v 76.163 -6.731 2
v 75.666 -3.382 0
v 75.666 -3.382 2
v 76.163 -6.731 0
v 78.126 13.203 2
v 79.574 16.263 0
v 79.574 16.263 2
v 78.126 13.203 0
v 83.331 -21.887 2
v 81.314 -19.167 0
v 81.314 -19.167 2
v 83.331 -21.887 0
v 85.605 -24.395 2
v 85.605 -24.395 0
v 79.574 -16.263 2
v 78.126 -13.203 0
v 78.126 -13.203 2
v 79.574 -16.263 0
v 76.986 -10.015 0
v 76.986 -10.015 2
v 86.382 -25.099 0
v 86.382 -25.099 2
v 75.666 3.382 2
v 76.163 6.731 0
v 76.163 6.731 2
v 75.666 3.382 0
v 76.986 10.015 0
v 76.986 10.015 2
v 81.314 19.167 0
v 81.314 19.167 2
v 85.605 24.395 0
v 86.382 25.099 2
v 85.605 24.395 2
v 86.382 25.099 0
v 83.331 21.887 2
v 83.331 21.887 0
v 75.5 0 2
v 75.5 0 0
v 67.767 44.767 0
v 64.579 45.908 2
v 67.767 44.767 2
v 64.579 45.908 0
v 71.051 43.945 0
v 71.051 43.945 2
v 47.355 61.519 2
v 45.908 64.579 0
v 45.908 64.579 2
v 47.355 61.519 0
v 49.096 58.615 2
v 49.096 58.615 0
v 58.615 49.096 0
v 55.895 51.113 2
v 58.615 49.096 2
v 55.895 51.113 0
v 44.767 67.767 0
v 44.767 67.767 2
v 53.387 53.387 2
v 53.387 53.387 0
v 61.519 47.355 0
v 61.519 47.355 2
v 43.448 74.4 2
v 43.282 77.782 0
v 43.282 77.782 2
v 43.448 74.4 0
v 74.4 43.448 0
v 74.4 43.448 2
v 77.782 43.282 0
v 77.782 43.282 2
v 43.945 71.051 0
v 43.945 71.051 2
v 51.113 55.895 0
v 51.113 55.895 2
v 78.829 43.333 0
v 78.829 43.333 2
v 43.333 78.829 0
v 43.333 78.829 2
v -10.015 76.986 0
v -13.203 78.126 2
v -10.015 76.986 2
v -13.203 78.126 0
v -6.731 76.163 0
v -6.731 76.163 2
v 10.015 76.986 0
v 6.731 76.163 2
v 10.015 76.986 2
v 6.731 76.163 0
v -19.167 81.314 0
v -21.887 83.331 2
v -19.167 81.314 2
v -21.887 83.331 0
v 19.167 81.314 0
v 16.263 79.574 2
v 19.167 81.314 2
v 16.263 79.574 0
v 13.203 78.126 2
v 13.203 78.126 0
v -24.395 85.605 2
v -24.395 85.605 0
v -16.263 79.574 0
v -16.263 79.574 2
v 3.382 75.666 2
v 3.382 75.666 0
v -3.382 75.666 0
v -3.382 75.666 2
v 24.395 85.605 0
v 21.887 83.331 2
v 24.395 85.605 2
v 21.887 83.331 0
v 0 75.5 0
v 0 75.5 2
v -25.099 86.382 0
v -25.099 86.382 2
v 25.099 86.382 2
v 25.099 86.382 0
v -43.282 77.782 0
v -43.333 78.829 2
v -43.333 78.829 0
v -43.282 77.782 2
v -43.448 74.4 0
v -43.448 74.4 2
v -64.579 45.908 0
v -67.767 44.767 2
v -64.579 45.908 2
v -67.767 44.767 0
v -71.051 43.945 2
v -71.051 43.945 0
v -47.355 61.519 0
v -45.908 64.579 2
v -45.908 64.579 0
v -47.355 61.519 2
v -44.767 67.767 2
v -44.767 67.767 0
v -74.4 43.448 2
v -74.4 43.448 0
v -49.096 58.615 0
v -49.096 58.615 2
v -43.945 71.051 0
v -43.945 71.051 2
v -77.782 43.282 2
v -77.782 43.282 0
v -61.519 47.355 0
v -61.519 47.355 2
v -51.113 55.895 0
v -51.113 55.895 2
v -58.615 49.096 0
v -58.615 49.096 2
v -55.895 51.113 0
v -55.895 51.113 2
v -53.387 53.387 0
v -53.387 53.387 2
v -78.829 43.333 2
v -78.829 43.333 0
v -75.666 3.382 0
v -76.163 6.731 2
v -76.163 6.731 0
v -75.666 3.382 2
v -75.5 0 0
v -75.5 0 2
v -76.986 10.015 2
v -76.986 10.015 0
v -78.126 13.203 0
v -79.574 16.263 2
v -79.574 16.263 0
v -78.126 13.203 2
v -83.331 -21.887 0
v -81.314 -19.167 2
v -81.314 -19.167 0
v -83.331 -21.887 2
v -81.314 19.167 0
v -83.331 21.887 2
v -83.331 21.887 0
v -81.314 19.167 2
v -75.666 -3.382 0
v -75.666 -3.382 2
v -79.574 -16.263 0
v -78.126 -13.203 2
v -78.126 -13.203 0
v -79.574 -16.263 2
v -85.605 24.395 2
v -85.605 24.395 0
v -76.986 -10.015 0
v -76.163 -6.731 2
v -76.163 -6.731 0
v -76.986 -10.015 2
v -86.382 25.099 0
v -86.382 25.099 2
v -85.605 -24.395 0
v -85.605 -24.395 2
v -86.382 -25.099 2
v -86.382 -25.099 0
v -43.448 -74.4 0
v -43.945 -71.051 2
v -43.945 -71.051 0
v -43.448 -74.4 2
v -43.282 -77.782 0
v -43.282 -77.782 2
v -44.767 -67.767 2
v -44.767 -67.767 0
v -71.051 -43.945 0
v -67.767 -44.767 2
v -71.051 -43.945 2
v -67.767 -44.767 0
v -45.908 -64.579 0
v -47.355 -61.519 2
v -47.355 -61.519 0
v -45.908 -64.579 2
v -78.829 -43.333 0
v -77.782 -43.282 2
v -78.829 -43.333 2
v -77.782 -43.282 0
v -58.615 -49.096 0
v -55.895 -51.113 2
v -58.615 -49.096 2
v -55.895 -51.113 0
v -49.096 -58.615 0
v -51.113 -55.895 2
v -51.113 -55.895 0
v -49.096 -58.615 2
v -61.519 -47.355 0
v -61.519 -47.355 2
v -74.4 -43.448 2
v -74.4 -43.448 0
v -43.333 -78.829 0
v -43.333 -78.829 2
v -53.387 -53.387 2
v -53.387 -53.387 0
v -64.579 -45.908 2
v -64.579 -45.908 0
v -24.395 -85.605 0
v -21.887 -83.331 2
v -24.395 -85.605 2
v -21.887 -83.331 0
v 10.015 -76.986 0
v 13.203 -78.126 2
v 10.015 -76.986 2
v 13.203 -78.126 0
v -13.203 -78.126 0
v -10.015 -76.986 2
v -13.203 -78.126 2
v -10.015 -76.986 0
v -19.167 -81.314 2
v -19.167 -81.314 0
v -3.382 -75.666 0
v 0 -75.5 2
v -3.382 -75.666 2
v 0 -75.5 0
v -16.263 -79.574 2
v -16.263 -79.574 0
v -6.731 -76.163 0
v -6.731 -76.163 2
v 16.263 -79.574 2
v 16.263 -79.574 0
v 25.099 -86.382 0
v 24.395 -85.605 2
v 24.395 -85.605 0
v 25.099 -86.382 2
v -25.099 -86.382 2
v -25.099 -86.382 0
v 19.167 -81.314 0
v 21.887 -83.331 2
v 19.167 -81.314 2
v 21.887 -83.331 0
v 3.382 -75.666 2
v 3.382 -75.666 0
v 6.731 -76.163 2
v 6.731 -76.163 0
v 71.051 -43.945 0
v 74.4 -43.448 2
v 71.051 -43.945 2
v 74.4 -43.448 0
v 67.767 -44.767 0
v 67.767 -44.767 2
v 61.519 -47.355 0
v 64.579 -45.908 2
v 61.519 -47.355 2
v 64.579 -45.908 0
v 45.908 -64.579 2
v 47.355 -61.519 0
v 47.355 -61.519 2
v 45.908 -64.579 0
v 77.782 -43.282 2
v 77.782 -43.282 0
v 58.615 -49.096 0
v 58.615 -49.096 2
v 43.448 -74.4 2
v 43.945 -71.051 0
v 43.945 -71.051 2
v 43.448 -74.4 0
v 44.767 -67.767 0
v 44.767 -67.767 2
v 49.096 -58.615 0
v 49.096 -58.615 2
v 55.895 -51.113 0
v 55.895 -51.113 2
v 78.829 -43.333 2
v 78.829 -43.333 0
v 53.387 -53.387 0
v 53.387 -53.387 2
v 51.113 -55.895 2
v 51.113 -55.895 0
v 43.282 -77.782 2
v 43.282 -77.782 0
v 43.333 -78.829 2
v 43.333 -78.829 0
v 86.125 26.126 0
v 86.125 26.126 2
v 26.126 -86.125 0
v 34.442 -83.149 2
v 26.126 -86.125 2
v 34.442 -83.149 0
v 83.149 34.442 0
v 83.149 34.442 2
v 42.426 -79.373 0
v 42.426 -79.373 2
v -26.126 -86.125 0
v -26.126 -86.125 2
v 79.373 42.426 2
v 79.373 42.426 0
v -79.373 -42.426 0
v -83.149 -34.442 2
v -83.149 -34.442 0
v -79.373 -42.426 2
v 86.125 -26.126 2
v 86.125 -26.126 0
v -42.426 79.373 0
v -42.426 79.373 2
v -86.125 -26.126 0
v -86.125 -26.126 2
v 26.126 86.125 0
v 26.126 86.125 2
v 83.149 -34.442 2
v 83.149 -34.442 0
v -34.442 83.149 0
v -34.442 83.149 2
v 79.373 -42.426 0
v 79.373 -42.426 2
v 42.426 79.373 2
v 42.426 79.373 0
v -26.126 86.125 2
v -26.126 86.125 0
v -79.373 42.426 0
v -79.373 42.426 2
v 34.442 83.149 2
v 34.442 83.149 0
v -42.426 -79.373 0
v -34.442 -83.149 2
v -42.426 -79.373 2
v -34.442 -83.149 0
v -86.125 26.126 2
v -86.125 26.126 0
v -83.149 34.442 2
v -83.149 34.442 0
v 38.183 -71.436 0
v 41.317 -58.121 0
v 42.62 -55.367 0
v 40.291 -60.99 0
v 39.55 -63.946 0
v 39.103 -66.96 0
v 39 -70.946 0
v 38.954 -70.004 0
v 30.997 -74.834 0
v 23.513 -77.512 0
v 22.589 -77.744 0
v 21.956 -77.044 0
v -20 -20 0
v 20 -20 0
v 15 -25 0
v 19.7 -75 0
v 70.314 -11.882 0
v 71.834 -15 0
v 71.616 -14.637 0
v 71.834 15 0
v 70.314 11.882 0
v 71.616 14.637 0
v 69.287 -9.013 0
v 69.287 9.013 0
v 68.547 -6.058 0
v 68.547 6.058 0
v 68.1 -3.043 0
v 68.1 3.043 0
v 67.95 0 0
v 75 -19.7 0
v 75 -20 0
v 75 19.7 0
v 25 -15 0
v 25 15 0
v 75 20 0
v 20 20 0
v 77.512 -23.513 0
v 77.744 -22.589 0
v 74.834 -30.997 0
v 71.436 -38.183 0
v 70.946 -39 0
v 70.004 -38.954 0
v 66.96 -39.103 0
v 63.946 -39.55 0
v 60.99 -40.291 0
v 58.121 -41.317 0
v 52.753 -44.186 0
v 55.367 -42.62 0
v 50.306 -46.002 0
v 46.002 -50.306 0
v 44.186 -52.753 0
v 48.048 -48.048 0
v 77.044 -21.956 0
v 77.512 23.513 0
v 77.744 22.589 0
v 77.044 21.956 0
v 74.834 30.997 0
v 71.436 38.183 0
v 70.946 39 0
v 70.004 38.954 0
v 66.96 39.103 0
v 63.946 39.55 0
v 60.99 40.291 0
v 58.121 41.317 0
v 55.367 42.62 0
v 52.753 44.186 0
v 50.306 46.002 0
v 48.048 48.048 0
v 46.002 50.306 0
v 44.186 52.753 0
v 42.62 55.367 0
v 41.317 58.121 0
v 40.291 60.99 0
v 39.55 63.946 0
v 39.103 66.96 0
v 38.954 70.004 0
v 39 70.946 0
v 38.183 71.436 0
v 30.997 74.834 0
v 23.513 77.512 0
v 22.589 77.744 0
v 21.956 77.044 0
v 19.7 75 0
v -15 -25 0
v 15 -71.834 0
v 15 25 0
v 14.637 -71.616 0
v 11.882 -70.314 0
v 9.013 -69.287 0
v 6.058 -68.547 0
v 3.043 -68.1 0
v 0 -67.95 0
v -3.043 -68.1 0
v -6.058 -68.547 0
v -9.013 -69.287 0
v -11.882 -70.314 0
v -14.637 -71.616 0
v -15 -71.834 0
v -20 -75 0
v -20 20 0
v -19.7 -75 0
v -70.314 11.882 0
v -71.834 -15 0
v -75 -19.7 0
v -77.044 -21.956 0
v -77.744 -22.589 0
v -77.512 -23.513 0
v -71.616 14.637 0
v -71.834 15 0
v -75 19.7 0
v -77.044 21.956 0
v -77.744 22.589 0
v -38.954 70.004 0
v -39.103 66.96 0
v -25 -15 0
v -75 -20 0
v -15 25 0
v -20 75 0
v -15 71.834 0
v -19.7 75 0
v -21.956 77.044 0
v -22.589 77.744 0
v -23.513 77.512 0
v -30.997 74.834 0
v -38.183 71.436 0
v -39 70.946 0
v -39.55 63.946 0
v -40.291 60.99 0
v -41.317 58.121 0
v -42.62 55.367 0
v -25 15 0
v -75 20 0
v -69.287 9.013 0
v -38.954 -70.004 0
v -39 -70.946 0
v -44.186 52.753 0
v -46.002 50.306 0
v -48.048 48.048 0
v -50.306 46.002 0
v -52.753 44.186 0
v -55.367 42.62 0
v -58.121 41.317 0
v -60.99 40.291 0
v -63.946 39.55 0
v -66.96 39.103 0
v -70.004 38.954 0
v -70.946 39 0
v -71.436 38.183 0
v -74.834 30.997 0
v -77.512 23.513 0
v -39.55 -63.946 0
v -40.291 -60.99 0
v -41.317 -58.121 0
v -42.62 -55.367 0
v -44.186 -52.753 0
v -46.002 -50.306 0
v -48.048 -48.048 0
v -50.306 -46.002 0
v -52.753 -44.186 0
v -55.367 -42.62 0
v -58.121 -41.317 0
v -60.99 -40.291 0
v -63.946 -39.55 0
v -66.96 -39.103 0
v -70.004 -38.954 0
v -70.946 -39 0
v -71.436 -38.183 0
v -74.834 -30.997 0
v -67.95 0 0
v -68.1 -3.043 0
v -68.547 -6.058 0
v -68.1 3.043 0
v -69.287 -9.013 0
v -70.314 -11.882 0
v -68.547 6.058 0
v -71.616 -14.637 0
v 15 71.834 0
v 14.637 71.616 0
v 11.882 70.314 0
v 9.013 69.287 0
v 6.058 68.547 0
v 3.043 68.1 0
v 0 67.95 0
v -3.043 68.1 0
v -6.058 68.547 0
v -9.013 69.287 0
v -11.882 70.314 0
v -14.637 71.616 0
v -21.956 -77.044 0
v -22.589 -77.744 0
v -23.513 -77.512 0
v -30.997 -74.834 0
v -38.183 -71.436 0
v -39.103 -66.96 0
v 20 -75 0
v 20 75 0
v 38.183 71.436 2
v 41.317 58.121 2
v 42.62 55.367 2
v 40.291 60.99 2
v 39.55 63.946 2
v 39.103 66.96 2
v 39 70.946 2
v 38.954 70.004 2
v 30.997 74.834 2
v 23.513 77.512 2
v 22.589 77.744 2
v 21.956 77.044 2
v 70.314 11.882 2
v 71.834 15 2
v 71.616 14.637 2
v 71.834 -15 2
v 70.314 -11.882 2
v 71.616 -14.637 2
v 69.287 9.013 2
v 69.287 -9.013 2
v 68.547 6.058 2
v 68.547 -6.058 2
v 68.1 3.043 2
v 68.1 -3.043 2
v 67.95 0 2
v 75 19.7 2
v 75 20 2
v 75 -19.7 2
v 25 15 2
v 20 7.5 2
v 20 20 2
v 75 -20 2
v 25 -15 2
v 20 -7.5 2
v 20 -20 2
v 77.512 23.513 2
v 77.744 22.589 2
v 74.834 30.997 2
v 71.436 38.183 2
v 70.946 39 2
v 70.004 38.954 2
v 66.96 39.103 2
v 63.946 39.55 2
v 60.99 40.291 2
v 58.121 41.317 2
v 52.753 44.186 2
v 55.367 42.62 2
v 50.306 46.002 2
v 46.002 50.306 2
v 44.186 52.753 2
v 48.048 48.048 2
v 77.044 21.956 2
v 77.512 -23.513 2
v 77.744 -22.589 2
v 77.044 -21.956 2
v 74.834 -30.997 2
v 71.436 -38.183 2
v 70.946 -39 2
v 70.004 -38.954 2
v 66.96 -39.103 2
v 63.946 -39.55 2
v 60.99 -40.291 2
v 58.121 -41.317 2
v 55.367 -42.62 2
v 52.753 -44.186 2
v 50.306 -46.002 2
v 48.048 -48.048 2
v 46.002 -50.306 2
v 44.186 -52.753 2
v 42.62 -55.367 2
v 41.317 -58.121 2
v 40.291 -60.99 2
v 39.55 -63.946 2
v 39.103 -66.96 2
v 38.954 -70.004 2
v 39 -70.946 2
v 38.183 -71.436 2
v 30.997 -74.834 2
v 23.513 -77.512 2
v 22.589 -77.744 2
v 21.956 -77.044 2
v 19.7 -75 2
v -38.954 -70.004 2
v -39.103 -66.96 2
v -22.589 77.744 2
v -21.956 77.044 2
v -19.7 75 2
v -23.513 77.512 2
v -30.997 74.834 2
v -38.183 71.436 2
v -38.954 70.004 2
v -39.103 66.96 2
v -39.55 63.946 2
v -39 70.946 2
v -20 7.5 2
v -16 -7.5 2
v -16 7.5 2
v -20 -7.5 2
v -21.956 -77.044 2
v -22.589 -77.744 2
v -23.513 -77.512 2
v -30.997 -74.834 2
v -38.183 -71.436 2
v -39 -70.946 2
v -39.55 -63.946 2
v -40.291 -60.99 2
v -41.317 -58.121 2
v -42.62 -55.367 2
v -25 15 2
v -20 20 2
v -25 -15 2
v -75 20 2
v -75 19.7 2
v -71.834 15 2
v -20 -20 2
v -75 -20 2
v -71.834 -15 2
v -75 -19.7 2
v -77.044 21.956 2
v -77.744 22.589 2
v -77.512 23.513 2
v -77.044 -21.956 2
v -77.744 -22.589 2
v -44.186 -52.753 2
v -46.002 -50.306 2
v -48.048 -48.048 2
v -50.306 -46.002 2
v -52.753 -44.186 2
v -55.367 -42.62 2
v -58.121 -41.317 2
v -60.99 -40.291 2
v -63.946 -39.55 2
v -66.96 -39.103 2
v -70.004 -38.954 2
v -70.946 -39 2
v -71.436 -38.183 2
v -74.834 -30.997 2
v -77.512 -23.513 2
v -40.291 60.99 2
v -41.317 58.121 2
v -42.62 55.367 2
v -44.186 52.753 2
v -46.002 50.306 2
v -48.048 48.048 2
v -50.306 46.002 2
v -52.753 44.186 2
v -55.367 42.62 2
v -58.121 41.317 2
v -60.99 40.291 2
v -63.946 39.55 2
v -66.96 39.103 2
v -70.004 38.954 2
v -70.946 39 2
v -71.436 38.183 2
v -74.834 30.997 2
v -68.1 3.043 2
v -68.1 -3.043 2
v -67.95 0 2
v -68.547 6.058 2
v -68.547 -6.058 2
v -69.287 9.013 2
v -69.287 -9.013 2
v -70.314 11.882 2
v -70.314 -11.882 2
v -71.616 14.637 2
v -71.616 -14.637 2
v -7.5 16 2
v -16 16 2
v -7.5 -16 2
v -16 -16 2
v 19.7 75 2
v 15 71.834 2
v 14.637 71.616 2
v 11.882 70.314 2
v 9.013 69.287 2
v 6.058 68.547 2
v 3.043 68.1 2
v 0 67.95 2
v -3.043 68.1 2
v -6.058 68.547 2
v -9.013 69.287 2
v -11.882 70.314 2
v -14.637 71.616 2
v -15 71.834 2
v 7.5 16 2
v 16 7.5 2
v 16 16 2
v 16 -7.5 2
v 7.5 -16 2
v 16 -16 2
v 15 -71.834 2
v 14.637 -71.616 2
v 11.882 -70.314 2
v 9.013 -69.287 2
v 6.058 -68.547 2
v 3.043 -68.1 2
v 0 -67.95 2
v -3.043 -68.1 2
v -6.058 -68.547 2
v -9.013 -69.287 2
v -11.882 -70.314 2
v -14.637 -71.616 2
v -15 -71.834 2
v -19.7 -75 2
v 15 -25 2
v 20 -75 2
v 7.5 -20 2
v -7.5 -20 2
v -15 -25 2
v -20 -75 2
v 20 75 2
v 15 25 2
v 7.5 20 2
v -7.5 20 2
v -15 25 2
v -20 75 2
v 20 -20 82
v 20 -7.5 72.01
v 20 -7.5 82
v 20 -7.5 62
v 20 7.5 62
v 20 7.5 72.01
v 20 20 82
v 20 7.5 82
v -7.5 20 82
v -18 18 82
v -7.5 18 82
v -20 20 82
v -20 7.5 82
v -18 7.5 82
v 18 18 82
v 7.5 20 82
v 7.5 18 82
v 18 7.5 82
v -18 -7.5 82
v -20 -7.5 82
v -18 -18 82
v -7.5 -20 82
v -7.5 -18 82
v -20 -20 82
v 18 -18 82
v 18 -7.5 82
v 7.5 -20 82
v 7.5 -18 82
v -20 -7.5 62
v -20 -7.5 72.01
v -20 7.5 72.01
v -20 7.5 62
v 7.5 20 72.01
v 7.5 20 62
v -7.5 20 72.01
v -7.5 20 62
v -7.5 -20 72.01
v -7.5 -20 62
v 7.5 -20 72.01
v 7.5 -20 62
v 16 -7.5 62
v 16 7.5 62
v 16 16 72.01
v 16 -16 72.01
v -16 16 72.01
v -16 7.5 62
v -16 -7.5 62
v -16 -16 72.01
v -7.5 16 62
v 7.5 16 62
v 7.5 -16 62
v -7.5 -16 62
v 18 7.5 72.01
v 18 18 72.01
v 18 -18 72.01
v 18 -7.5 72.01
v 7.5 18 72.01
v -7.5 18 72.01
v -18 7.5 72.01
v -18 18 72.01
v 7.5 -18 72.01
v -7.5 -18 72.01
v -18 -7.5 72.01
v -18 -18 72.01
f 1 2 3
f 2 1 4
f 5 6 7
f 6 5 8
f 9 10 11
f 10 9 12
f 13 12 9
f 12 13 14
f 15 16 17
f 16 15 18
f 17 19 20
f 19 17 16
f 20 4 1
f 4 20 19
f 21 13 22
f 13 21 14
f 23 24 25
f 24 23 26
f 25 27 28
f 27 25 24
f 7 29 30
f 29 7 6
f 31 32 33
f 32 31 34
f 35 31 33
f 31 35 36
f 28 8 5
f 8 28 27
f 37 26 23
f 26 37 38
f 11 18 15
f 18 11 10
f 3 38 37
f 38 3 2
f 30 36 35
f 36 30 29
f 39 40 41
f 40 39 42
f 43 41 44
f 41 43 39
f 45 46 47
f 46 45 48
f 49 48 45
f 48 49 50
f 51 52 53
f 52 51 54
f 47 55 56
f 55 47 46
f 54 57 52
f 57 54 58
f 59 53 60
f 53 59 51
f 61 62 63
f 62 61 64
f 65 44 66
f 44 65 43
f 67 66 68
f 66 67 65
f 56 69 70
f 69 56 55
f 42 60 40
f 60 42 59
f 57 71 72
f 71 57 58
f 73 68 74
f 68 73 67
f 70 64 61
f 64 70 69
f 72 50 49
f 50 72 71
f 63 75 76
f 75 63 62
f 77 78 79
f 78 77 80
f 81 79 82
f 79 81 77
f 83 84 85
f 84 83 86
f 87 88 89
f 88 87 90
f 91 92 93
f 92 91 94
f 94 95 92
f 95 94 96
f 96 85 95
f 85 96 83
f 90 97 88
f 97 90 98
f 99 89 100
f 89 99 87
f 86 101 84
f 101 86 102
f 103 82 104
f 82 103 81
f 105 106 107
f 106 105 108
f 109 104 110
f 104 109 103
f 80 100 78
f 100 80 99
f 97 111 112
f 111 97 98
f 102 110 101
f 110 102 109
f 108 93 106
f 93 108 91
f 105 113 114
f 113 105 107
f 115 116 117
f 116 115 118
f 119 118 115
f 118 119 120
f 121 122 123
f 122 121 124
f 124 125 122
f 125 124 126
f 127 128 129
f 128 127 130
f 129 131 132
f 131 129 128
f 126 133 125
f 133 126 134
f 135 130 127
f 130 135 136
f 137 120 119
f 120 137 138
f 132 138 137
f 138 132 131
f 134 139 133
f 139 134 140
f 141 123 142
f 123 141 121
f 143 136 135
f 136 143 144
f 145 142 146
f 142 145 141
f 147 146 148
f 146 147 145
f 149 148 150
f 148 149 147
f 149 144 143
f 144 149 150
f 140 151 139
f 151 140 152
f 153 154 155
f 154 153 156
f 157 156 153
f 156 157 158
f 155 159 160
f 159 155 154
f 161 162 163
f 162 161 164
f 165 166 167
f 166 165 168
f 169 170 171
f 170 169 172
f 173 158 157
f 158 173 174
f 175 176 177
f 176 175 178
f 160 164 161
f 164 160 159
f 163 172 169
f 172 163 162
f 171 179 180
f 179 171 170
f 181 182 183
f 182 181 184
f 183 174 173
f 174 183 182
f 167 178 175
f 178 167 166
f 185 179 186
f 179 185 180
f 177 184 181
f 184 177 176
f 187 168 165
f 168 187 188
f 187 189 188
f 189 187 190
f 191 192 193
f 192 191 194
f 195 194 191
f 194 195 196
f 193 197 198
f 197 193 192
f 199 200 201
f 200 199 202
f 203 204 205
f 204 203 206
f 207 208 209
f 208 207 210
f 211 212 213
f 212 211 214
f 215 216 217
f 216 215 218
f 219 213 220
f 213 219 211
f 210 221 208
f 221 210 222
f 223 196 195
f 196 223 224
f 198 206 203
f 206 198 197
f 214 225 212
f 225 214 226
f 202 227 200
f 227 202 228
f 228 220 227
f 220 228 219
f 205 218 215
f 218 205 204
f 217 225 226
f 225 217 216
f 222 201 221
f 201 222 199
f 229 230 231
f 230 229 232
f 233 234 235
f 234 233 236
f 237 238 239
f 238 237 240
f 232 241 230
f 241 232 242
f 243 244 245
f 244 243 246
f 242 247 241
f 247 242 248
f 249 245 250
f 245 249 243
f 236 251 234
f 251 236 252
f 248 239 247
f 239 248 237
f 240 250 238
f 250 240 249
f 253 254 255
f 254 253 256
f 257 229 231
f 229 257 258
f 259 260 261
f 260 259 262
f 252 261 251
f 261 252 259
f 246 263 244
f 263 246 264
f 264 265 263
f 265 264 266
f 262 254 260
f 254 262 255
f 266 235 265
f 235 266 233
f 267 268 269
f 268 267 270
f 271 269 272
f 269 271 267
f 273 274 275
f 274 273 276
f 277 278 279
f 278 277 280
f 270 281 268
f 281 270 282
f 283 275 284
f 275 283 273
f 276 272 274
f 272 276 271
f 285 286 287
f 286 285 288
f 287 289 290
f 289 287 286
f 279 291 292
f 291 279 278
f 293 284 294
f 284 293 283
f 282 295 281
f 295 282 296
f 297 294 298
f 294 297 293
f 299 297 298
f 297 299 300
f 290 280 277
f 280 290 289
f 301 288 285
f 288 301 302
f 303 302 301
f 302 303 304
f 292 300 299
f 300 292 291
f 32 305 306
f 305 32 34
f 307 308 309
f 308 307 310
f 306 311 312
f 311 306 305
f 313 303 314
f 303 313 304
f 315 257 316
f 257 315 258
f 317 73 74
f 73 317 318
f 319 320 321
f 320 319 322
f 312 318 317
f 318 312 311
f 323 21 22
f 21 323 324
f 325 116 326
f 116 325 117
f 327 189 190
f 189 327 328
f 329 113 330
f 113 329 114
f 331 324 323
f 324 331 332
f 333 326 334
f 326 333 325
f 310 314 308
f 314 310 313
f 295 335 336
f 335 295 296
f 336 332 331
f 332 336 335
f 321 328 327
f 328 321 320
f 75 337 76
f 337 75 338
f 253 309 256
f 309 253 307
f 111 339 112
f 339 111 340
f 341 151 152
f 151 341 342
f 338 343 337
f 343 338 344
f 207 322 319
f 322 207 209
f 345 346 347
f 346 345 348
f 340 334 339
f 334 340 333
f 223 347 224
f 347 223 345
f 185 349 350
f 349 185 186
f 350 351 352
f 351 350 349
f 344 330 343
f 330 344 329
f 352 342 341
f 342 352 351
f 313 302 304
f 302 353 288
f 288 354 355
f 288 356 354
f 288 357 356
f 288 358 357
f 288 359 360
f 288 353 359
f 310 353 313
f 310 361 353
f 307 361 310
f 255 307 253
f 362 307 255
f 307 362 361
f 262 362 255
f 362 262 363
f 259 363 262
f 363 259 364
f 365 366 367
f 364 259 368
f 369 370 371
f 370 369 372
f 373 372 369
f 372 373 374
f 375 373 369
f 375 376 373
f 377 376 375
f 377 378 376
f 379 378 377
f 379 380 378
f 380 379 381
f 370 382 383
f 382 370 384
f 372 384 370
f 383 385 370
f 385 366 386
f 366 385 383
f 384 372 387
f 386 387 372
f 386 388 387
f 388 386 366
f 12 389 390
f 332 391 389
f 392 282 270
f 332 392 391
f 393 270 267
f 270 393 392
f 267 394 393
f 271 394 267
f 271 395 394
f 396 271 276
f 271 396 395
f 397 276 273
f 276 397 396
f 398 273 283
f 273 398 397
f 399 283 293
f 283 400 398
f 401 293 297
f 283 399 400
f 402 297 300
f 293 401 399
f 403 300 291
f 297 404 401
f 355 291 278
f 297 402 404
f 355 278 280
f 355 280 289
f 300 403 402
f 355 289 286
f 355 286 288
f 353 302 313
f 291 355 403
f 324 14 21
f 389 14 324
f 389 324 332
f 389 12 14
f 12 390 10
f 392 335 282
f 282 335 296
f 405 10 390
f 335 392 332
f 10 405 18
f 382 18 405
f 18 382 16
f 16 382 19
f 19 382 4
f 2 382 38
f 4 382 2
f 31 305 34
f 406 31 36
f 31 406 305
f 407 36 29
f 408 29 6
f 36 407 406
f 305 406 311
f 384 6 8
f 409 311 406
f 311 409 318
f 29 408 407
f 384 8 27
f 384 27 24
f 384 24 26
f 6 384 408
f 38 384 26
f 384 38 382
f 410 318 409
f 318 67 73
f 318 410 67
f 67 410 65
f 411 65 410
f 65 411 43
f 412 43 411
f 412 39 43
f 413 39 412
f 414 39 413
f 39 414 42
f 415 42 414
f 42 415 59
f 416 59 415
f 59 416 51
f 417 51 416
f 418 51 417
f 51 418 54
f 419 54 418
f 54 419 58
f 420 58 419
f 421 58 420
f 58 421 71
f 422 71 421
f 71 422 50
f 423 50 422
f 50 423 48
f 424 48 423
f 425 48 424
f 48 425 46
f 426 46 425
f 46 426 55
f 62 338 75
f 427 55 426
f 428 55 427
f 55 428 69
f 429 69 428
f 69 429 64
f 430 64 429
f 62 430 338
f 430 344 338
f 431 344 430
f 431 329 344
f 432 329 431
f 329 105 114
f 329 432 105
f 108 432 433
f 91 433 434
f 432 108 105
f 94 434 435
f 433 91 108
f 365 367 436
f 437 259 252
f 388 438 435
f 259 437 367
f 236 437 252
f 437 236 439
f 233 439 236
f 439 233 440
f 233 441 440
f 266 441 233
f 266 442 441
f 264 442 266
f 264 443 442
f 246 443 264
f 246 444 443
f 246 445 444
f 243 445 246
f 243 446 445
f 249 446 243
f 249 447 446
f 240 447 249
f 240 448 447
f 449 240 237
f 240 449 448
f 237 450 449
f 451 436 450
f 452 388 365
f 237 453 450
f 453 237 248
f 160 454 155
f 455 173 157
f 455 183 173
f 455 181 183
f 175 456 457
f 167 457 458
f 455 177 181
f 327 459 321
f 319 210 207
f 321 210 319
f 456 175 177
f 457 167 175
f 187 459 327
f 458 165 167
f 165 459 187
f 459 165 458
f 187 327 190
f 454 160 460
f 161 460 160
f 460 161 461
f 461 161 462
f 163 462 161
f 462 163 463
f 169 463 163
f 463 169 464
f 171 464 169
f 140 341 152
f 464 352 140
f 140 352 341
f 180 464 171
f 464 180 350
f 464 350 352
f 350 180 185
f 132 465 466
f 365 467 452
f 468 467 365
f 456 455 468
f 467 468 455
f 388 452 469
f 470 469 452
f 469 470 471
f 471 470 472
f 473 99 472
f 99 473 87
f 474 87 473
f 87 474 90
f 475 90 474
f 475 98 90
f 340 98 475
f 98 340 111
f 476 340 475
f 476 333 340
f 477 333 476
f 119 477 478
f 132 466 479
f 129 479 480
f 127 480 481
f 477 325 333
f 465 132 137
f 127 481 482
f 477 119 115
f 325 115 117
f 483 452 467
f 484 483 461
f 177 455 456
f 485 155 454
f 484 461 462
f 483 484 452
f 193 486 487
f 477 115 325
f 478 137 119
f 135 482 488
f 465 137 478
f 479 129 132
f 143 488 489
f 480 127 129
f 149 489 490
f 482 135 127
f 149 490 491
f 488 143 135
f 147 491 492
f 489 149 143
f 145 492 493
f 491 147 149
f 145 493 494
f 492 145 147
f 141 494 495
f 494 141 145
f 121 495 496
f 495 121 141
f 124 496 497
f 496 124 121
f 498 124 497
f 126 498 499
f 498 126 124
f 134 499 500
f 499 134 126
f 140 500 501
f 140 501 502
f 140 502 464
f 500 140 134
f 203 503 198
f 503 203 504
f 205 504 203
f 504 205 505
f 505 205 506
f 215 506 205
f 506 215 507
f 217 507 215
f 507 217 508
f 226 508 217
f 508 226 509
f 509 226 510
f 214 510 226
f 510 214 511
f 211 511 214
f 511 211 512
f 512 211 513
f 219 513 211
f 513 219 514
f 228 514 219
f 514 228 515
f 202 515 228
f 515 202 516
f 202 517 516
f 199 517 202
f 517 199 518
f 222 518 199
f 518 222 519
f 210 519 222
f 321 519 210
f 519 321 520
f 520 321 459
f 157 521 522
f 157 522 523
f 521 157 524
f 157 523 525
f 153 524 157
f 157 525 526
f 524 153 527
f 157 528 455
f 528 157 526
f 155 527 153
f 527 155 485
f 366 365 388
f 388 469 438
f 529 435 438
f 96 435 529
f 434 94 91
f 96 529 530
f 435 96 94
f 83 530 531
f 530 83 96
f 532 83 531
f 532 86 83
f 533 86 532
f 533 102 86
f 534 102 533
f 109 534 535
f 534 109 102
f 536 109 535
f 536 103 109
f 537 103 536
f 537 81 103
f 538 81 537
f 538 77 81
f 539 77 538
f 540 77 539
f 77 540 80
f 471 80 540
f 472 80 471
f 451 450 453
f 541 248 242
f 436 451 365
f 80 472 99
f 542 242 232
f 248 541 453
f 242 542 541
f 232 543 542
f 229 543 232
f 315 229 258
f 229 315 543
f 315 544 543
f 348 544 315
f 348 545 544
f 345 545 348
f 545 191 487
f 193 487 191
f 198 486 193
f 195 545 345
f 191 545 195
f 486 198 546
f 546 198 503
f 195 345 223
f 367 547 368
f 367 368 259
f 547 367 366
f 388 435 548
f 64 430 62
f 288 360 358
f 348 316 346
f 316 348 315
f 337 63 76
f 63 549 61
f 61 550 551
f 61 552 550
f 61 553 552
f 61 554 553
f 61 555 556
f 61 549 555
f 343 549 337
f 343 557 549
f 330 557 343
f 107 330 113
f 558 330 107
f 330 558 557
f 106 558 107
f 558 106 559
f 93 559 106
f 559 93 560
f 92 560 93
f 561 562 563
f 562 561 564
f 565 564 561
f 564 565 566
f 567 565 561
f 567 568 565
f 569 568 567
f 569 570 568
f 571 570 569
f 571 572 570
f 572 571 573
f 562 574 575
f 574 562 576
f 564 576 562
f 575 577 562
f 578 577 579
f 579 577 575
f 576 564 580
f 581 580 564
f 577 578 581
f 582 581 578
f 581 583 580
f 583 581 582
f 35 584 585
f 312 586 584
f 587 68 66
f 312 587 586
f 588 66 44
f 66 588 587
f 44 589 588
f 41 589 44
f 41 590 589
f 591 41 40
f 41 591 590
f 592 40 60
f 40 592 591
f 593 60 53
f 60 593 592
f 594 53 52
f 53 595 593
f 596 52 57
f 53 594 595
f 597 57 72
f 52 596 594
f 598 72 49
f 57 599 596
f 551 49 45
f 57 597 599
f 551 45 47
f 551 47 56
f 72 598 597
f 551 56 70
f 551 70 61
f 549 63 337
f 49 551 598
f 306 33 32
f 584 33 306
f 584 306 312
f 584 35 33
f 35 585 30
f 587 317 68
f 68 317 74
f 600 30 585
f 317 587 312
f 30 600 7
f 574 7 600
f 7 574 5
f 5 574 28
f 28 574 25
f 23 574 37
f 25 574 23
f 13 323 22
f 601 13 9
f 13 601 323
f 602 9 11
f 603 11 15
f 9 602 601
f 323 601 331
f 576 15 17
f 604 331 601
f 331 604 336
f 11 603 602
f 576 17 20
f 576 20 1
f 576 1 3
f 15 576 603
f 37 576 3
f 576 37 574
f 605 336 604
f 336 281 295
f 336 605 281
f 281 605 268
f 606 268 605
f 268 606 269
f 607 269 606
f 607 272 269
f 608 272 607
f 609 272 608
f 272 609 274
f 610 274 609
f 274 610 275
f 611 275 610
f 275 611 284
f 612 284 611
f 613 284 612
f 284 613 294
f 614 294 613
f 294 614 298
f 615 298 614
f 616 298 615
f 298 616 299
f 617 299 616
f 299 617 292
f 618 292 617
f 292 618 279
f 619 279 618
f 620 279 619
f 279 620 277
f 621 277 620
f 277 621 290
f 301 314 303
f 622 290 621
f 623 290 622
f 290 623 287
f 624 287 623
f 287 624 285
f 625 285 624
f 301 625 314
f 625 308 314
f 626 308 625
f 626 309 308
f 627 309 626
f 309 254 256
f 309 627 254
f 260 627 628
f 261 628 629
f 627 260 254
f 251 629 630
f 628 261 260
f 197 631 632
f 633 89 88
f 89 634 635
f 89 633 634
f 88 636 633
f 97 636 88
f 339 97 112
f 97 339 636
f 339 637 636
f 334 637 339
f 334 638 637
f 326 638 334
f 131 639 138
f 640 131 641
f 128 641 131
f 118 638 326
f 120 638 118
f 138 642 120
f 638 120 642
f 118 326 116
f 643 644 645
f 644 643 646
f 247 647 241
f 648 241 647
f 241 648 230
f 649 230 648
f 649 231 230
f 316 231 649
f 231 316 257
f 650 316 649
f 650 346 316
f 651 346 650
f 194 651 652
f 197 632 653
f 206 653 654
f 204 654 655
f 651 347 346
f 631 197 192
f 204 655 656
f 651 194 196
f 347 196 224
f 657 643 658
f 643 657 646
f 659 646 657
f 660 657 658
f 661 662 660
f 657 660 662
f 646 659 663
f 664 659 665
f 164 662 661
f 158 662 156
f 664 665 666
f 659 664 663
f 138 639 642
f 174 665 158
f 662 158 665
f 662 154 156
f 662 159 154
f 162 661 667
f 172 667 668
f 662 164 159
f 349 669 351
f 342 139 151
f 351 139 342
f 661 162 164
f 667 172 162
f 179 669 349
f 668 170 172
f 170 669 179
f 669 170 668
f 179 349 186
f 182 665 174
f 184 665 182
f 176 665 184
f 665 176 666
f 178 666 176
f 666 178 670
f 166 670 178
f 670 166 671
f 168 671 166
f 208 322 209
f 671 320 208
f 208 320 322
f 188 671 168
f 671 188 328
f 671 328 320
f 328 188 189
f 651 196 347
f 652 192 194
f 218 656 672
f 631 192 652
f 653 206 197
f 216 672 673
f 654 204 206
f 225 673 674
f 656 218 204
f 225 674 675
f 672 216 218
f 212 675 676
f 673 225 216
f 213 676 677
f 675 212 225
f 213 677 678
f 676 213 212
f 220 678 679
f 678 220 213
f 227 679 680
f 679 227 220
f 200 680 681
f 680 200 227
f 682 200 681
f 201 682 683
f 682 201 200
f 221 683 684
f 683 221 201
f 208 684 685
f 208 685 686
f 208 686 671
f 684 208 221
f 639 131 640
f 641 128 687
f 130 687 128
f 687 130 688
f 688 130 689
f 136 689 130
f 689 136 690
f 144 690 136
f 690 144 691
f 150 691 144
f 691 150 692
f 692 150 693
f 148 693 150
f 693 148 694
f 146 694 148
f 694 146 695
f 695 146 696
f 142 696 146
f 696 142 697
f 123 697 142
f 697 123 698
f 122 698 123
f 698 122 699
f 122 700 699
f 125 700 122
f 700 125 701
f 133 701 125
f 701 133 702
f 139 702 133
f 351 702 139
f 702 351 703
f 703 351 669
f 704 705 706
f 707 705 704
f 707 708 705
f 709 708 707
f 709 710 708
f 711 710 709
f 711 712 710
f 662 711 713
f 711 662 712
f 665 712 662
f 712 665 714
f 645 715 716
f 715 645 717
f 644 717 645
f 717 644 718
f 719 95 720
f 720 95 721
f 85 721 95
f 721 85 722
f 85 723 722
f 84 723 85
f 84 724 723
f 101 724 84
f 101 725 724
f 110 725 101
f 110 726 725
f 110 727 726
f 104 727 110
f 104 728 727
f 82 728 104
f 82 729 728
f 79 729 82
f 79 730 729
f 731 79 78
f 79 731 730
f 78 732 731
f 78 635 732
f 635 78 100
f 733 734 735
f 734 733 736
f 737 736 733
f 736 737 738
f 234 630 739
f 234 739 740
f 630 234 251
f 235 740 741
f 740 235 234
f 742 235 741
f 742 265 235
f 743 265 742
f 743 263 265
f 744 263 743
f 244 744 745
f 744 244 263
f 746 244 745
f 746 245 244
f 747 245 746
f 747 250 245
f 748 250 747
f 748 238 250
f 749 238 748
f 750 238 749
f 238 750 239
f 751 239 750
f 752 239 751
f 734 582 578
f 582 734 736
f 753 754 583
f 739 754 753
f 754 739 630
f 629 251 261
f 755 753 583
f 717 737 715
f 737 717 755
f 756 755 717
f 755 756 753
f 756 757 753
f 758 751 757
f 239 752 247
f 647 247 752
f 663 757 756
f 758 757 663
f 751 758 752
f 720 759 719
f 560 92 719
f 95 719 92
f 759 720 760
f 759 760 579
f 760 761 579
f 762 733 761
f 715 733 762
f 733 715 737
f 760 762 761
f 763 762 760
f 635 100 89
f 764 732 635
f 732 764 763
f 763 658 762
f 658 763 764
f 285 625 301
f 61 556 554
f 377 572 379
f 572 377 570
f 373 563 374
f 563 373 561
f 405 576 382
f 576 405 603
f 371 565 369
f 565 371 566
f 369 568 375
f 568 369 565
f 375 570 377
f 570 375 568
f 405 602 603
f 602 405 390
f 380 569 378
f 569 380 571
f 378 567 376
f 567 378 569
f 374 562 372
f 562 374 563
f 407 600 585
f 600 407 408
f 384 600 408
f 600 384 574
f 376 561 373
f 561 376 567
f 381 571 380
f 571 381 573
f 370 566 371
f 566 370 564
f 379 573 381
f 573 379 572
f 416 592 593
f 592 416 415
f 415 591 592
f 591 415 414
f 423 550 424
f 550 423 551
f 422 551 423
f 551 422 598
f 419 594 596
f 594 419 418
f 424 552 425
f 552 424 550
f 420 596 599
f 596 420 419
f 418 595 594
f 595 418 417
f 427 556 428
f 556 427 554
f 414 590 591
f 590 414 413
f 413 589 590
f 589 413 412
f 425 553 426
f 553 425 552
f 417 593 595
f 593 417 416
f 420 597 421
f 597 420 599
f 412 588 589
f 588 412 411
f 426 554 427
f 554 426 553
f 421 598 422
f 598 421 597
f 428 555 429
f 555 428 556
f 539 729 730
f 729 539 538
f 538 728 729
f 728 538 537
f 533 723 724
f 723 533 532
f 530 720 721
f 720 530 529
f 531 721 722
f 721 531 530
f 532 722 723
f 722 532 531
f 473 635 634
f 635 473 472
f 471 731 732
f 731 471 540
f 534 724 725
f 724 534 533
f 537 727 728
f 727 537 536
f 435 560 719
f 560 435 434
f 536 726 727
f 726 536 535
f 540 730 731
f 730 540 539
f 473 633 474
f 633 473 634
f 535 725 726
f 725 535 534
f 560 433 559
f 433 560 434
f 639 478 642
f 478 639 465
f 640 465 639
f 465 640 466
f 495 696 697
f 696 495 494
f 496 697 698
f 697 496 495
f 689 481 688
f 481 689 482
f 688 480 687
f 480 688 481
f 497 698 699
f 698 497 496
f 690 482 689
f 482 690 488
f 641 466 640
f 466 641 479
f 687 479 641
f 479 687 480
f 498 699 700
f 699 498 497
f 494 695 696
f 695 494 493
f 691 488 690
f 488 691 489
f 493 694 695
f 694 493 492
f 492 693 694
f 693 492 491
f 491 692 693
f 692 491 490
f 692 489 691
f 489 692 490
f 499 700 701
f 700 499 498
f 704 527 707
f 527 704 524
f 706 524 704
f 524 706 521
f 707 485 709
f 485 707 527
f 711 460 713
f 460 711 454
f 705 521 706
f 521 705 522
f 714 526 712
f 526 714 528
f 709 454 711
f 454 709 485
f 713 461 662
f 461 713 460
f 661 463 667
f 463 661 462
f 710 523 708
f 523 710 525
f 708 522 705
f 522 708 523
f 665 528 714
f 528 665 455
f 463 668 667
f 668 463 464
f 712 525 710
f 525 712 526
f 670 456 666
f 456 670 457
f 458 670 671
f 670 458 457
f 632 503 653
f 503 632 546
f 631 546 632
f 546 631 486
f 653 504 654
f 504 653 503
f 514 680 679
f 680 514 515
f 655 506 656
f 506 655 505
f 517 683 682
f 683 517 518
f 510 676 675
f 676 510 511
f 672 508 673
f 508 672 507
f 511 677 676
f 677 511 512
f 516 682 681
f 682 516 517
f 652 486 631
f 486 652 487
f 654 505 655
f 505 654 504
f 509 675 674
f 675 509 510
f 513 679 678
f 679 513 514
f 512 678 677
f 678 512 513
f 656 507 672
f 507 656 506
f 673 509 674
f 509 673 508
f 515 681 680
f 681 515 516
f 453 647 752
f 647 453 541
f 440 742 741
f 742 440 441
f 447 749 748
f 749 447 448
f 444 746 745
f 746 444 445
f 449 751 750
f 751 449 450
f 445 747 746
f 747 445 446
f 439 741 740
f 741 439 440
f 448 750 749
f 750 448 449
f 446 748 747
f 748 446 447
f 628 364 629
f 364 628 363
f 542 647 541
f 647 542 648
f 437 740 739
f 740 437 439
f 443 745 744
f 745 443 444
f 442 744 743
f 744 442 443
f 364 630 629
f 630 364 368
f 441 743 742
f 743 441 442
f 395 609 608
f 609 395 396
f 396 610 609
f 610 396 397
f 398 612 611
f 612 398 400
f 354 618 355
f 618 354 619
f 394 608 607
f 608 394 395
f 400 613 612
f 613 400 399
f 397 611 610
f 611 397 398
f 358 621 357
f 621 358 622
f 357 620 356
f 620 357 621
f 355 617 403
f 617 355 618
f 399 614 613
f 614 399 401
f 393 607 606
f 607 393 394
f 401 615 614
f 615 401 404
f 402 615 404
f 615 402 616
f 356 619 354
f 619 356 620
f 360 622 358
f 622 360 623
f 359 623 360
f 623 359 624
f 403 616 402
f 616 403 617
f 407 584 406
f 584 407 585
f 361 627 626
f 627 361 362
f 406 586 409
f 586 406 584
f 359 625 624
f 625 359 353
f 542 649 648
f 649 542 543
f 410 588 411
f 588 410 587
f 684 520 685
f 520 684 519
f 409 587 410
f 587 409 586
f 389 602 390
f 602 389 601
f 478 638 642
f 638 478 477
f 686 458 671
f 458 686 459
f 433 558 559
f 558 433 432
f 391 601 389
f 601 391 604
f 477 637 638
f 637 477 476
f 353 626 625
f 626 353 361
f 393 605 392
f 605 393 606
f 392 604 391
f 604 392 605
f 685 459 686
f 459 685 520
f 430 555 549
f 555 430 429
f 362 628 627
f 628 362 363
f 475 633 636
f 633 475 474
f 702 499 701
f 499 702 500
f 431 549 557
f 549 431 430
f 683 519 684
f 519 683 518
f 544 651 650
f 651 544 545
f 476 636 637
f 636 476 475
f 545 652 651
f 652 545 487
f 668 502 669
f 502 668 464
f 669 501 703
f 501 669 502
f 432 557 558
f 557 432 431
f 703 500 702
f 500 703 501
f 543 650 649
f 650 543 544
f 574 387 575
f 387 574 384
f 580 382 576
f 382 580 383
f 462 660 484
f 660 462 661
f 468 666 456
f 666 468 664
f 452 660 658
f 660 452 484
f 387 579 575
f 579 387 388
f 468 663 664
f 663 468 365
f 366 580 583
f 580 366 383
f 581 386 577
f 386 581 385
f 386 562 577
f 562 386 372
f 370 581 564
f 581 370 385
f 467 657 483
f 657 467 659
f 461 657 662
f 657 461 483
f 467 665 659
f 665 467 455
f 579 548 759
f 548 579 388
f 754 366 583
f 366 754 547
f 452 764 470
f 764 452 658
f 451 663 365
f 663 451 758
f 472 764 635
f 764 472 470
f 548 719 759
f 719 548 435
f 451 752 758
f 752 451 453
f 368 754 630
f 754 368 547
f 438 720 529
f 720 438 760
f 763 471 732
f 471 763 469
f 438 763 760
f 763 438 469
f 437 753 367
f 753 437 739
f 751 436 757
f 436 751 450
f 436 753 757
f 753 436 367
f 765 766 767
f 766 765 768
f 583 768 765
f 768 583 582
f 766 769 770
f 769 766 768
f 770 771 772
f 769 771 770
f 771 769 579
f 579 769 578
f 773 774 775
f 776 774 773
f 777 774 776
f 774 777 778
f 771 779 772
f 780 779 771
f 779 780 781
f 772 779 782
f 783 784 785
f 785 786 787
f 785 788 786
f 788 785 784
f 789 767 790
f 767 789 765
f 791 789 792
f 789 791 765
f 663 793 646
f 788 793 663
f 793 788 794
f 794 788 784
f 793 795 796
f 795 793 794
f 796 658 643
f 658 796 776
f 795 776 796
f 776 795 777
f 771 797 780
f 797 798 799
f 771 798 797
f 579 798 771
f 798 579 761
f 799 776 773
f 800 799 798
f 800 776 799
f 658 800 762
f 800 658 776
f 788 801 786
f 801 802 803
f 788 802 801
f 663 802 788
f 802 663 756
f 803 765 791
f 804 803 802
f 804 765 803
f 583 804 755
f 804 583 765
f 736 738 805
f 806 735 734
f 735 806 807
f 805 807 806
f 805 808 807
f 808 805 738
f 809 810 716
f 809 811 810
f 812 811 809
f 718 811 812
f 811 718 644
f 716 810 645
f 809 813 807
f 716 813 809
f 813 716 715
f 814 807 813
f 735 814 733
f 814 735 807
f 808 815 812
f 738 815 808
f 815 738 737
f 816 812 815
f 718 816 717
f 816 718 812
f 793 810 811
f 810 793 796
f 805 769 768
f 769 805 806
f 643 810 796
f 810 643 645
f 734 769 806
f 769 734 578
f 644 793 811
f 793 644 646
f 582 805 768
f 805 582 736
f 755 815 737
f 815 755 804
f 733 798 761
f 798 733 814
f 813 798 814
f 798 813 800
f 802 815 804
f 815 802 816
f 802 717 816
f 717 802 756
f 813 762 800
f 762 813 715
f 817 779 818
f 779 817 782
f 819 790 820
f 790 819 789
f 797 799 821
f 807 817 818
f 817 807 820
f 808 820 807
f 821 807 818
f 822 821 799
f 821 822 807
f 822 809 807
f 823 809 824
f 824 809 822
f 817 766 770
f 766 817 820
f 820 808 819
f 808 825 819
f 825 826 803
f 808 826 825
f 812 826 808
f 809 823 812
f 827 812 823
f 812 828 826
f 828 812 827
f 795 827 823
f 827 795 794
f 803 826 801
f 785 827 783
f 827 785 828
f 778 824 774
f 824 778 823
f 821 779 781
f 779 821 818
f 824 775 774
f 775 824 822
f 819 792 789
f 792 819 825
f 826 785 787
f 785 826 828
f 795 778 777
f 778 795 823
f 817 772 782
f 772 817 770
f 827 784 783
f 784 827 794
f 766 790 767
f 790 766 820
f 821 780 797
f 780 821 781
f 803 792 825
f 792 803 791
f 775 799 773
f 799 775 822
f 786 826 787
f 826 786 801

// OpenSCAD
$fn=64;

function point_from_angle(angle_deg, r) = 
    [r*cos(angle_deg), r*sin(angle_deg)];
    
r_hammer = 70;
r_glass_outer = 40;
r_glass = 69/2;

height_bottom = 2;


module kranz(){
    difference(){
        cylinder(r=90, h=height_bottom);
        
        for ( i = [0 : 45 : 360] ){
        p = point_from_angle(i, r_hammer+r_glass_outer);
        translate([p[0], p[1], -.1]){
            cylinder(r=r_glass, h=10);
            //translate([0,0,10])
            //cylinder(r=r_glass_outer, h=5);
        }
    }
    }
}

difference(){
    union(){
        difference(){
            kranz();
            translate([0,0,-0.1])
            scale([0.9, 0.9, 1.5])
            kranz();
        }
        
        
        translate([0,0,height_bottom/2])
        difference(){
            cube([150, 40, height_bottom], center=true);
            
            translate([50,0,-0.1])
            cube([50, 30, height_bottom+1], center=true);
            
            translate([-50,0,-0.1])
            cube([50, 30, height_bottom+1], center=true);
        }
        
        translate([0,0,height_bottom/2])
        difference(){
            cube([40, 150, height_bottom], center=true);
            translate([0,50,-0.1])
            cube([30, 50, height_bottom+1], center=true);        
            
            translate([0,-50,-0.1])
            cube([30, 50, height_bottom+1], center=true);
        }
    
        translate([0,0,40+height_bottom])
        difference(){
            cube([40,40,80], center=true);
            
            translate([0,0,-5])
            cube([32,32,90], center=true);
            
            translate([0,0,-10])
            cube([50,15,60], center=true);
            
            translate([0,0,-10])
            cube([15,50,60], center=true);
            
            translate([0,0,40.01-5])
            cube([36,36,10], center=true);
            
            translate([0,0,40.01-5])
            cube([50,15,10], center=true);
            
            translate([0,0,40.01-5])
            cube([15,50,10], center=true);
        }
    }



}
